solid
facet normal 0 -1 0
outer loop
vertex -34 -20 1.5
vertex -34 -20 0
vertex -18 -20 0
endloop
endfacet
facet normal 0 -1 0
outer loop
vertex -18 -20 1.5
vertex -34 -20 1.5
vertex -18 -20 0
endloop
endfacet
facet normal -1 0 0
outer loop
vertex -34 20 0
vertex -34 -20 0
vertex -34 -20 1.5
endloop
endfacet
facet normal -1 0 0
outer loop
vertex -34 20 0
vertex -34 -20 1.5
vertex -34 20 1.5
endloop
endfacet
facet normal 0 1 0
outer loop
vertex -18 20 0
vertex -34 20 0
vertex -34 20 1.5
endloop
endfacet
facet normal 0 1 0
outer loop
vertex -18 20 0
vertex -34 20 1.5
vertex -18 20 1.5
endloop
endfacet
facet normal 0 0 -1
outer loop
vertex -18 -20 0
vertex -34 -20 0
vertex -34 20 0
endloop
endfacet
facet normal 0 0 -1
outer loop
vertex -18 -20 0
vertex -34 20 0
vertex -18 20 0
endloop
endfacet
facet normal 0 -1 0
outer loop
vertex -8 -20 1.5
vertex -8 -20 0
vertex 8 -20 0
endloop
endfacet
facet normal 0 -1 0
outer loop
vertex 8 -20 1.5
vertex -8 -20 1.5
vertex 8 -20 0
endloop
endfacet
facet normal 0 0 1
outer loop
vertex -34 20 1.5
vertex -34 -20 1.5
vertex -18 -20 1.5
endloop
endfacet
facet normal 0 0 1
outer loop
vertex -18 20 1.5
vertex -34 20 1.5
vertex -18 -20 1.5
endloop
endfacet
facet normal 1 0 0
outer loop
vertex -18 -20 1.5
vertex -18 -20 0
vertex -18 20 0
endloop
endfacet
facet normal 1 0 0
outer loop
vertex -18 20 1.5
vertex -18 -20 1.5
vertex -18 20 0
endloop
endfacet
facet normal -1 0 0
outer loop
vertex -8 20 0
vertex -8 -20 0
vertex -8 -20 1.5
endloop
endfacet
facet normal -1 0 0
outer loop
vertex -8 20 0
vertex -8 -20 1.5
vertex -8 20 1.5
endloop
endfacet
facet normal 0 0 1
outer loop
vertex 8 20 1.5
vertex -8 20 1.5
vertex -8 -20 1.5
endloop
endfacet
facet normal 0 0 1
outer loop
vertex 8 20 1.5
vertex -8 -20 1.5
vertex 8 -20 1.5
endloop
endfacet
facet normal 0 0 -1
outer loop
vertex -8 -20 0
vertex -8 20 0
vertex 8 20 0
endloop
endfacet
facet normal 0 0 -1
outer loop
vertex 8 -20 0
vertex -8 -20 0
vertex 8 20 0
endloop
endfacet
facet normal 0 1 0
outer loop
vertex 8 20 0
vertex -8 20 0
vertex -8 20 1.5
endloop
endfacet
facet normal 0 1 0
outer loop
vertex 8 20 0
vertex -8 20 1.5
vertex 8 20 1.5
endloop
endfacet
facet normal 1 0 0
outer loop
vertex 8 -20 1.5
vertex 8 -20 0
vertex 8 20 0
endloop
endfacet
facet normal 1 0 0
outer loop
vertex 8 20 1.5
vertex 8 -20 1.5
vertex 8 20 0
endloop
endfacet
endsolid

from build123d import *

# Parameters (mm, degrees)
F0_W     = 16
F0_H     = 40
F1_DEPTH = 1.5
F2_DEPTH = 1.5
F3_DEPTH = 1.5


with BuildPart() as f1:
    # F0 (on Top) → F1 (new body)
    with BuildSketch(Plane.XY):
        with Locations((-26, 0)):
            Rectangle(F0_W, F0_H)
    extrude(amount=F1_DEPTH)


with BuildPart() as f2:
    # F0 (on Top) → F2 (new body)
    with BuildSketch(Plane.XY):
        Rectangle(F0_W, F0_H)
    extrude(amount=F2_DEPTH)


with BuildPart() as f3:
    # F0 (on Top) → F3 (new body)
    with BuildSketch(Plane.XY):
        with Locations((26, 0)):
            Rectangle(F0_W, F0_H)
    extrude(amount=F3_DEPTH)


solid = Compound([f1.part, f2.part])
